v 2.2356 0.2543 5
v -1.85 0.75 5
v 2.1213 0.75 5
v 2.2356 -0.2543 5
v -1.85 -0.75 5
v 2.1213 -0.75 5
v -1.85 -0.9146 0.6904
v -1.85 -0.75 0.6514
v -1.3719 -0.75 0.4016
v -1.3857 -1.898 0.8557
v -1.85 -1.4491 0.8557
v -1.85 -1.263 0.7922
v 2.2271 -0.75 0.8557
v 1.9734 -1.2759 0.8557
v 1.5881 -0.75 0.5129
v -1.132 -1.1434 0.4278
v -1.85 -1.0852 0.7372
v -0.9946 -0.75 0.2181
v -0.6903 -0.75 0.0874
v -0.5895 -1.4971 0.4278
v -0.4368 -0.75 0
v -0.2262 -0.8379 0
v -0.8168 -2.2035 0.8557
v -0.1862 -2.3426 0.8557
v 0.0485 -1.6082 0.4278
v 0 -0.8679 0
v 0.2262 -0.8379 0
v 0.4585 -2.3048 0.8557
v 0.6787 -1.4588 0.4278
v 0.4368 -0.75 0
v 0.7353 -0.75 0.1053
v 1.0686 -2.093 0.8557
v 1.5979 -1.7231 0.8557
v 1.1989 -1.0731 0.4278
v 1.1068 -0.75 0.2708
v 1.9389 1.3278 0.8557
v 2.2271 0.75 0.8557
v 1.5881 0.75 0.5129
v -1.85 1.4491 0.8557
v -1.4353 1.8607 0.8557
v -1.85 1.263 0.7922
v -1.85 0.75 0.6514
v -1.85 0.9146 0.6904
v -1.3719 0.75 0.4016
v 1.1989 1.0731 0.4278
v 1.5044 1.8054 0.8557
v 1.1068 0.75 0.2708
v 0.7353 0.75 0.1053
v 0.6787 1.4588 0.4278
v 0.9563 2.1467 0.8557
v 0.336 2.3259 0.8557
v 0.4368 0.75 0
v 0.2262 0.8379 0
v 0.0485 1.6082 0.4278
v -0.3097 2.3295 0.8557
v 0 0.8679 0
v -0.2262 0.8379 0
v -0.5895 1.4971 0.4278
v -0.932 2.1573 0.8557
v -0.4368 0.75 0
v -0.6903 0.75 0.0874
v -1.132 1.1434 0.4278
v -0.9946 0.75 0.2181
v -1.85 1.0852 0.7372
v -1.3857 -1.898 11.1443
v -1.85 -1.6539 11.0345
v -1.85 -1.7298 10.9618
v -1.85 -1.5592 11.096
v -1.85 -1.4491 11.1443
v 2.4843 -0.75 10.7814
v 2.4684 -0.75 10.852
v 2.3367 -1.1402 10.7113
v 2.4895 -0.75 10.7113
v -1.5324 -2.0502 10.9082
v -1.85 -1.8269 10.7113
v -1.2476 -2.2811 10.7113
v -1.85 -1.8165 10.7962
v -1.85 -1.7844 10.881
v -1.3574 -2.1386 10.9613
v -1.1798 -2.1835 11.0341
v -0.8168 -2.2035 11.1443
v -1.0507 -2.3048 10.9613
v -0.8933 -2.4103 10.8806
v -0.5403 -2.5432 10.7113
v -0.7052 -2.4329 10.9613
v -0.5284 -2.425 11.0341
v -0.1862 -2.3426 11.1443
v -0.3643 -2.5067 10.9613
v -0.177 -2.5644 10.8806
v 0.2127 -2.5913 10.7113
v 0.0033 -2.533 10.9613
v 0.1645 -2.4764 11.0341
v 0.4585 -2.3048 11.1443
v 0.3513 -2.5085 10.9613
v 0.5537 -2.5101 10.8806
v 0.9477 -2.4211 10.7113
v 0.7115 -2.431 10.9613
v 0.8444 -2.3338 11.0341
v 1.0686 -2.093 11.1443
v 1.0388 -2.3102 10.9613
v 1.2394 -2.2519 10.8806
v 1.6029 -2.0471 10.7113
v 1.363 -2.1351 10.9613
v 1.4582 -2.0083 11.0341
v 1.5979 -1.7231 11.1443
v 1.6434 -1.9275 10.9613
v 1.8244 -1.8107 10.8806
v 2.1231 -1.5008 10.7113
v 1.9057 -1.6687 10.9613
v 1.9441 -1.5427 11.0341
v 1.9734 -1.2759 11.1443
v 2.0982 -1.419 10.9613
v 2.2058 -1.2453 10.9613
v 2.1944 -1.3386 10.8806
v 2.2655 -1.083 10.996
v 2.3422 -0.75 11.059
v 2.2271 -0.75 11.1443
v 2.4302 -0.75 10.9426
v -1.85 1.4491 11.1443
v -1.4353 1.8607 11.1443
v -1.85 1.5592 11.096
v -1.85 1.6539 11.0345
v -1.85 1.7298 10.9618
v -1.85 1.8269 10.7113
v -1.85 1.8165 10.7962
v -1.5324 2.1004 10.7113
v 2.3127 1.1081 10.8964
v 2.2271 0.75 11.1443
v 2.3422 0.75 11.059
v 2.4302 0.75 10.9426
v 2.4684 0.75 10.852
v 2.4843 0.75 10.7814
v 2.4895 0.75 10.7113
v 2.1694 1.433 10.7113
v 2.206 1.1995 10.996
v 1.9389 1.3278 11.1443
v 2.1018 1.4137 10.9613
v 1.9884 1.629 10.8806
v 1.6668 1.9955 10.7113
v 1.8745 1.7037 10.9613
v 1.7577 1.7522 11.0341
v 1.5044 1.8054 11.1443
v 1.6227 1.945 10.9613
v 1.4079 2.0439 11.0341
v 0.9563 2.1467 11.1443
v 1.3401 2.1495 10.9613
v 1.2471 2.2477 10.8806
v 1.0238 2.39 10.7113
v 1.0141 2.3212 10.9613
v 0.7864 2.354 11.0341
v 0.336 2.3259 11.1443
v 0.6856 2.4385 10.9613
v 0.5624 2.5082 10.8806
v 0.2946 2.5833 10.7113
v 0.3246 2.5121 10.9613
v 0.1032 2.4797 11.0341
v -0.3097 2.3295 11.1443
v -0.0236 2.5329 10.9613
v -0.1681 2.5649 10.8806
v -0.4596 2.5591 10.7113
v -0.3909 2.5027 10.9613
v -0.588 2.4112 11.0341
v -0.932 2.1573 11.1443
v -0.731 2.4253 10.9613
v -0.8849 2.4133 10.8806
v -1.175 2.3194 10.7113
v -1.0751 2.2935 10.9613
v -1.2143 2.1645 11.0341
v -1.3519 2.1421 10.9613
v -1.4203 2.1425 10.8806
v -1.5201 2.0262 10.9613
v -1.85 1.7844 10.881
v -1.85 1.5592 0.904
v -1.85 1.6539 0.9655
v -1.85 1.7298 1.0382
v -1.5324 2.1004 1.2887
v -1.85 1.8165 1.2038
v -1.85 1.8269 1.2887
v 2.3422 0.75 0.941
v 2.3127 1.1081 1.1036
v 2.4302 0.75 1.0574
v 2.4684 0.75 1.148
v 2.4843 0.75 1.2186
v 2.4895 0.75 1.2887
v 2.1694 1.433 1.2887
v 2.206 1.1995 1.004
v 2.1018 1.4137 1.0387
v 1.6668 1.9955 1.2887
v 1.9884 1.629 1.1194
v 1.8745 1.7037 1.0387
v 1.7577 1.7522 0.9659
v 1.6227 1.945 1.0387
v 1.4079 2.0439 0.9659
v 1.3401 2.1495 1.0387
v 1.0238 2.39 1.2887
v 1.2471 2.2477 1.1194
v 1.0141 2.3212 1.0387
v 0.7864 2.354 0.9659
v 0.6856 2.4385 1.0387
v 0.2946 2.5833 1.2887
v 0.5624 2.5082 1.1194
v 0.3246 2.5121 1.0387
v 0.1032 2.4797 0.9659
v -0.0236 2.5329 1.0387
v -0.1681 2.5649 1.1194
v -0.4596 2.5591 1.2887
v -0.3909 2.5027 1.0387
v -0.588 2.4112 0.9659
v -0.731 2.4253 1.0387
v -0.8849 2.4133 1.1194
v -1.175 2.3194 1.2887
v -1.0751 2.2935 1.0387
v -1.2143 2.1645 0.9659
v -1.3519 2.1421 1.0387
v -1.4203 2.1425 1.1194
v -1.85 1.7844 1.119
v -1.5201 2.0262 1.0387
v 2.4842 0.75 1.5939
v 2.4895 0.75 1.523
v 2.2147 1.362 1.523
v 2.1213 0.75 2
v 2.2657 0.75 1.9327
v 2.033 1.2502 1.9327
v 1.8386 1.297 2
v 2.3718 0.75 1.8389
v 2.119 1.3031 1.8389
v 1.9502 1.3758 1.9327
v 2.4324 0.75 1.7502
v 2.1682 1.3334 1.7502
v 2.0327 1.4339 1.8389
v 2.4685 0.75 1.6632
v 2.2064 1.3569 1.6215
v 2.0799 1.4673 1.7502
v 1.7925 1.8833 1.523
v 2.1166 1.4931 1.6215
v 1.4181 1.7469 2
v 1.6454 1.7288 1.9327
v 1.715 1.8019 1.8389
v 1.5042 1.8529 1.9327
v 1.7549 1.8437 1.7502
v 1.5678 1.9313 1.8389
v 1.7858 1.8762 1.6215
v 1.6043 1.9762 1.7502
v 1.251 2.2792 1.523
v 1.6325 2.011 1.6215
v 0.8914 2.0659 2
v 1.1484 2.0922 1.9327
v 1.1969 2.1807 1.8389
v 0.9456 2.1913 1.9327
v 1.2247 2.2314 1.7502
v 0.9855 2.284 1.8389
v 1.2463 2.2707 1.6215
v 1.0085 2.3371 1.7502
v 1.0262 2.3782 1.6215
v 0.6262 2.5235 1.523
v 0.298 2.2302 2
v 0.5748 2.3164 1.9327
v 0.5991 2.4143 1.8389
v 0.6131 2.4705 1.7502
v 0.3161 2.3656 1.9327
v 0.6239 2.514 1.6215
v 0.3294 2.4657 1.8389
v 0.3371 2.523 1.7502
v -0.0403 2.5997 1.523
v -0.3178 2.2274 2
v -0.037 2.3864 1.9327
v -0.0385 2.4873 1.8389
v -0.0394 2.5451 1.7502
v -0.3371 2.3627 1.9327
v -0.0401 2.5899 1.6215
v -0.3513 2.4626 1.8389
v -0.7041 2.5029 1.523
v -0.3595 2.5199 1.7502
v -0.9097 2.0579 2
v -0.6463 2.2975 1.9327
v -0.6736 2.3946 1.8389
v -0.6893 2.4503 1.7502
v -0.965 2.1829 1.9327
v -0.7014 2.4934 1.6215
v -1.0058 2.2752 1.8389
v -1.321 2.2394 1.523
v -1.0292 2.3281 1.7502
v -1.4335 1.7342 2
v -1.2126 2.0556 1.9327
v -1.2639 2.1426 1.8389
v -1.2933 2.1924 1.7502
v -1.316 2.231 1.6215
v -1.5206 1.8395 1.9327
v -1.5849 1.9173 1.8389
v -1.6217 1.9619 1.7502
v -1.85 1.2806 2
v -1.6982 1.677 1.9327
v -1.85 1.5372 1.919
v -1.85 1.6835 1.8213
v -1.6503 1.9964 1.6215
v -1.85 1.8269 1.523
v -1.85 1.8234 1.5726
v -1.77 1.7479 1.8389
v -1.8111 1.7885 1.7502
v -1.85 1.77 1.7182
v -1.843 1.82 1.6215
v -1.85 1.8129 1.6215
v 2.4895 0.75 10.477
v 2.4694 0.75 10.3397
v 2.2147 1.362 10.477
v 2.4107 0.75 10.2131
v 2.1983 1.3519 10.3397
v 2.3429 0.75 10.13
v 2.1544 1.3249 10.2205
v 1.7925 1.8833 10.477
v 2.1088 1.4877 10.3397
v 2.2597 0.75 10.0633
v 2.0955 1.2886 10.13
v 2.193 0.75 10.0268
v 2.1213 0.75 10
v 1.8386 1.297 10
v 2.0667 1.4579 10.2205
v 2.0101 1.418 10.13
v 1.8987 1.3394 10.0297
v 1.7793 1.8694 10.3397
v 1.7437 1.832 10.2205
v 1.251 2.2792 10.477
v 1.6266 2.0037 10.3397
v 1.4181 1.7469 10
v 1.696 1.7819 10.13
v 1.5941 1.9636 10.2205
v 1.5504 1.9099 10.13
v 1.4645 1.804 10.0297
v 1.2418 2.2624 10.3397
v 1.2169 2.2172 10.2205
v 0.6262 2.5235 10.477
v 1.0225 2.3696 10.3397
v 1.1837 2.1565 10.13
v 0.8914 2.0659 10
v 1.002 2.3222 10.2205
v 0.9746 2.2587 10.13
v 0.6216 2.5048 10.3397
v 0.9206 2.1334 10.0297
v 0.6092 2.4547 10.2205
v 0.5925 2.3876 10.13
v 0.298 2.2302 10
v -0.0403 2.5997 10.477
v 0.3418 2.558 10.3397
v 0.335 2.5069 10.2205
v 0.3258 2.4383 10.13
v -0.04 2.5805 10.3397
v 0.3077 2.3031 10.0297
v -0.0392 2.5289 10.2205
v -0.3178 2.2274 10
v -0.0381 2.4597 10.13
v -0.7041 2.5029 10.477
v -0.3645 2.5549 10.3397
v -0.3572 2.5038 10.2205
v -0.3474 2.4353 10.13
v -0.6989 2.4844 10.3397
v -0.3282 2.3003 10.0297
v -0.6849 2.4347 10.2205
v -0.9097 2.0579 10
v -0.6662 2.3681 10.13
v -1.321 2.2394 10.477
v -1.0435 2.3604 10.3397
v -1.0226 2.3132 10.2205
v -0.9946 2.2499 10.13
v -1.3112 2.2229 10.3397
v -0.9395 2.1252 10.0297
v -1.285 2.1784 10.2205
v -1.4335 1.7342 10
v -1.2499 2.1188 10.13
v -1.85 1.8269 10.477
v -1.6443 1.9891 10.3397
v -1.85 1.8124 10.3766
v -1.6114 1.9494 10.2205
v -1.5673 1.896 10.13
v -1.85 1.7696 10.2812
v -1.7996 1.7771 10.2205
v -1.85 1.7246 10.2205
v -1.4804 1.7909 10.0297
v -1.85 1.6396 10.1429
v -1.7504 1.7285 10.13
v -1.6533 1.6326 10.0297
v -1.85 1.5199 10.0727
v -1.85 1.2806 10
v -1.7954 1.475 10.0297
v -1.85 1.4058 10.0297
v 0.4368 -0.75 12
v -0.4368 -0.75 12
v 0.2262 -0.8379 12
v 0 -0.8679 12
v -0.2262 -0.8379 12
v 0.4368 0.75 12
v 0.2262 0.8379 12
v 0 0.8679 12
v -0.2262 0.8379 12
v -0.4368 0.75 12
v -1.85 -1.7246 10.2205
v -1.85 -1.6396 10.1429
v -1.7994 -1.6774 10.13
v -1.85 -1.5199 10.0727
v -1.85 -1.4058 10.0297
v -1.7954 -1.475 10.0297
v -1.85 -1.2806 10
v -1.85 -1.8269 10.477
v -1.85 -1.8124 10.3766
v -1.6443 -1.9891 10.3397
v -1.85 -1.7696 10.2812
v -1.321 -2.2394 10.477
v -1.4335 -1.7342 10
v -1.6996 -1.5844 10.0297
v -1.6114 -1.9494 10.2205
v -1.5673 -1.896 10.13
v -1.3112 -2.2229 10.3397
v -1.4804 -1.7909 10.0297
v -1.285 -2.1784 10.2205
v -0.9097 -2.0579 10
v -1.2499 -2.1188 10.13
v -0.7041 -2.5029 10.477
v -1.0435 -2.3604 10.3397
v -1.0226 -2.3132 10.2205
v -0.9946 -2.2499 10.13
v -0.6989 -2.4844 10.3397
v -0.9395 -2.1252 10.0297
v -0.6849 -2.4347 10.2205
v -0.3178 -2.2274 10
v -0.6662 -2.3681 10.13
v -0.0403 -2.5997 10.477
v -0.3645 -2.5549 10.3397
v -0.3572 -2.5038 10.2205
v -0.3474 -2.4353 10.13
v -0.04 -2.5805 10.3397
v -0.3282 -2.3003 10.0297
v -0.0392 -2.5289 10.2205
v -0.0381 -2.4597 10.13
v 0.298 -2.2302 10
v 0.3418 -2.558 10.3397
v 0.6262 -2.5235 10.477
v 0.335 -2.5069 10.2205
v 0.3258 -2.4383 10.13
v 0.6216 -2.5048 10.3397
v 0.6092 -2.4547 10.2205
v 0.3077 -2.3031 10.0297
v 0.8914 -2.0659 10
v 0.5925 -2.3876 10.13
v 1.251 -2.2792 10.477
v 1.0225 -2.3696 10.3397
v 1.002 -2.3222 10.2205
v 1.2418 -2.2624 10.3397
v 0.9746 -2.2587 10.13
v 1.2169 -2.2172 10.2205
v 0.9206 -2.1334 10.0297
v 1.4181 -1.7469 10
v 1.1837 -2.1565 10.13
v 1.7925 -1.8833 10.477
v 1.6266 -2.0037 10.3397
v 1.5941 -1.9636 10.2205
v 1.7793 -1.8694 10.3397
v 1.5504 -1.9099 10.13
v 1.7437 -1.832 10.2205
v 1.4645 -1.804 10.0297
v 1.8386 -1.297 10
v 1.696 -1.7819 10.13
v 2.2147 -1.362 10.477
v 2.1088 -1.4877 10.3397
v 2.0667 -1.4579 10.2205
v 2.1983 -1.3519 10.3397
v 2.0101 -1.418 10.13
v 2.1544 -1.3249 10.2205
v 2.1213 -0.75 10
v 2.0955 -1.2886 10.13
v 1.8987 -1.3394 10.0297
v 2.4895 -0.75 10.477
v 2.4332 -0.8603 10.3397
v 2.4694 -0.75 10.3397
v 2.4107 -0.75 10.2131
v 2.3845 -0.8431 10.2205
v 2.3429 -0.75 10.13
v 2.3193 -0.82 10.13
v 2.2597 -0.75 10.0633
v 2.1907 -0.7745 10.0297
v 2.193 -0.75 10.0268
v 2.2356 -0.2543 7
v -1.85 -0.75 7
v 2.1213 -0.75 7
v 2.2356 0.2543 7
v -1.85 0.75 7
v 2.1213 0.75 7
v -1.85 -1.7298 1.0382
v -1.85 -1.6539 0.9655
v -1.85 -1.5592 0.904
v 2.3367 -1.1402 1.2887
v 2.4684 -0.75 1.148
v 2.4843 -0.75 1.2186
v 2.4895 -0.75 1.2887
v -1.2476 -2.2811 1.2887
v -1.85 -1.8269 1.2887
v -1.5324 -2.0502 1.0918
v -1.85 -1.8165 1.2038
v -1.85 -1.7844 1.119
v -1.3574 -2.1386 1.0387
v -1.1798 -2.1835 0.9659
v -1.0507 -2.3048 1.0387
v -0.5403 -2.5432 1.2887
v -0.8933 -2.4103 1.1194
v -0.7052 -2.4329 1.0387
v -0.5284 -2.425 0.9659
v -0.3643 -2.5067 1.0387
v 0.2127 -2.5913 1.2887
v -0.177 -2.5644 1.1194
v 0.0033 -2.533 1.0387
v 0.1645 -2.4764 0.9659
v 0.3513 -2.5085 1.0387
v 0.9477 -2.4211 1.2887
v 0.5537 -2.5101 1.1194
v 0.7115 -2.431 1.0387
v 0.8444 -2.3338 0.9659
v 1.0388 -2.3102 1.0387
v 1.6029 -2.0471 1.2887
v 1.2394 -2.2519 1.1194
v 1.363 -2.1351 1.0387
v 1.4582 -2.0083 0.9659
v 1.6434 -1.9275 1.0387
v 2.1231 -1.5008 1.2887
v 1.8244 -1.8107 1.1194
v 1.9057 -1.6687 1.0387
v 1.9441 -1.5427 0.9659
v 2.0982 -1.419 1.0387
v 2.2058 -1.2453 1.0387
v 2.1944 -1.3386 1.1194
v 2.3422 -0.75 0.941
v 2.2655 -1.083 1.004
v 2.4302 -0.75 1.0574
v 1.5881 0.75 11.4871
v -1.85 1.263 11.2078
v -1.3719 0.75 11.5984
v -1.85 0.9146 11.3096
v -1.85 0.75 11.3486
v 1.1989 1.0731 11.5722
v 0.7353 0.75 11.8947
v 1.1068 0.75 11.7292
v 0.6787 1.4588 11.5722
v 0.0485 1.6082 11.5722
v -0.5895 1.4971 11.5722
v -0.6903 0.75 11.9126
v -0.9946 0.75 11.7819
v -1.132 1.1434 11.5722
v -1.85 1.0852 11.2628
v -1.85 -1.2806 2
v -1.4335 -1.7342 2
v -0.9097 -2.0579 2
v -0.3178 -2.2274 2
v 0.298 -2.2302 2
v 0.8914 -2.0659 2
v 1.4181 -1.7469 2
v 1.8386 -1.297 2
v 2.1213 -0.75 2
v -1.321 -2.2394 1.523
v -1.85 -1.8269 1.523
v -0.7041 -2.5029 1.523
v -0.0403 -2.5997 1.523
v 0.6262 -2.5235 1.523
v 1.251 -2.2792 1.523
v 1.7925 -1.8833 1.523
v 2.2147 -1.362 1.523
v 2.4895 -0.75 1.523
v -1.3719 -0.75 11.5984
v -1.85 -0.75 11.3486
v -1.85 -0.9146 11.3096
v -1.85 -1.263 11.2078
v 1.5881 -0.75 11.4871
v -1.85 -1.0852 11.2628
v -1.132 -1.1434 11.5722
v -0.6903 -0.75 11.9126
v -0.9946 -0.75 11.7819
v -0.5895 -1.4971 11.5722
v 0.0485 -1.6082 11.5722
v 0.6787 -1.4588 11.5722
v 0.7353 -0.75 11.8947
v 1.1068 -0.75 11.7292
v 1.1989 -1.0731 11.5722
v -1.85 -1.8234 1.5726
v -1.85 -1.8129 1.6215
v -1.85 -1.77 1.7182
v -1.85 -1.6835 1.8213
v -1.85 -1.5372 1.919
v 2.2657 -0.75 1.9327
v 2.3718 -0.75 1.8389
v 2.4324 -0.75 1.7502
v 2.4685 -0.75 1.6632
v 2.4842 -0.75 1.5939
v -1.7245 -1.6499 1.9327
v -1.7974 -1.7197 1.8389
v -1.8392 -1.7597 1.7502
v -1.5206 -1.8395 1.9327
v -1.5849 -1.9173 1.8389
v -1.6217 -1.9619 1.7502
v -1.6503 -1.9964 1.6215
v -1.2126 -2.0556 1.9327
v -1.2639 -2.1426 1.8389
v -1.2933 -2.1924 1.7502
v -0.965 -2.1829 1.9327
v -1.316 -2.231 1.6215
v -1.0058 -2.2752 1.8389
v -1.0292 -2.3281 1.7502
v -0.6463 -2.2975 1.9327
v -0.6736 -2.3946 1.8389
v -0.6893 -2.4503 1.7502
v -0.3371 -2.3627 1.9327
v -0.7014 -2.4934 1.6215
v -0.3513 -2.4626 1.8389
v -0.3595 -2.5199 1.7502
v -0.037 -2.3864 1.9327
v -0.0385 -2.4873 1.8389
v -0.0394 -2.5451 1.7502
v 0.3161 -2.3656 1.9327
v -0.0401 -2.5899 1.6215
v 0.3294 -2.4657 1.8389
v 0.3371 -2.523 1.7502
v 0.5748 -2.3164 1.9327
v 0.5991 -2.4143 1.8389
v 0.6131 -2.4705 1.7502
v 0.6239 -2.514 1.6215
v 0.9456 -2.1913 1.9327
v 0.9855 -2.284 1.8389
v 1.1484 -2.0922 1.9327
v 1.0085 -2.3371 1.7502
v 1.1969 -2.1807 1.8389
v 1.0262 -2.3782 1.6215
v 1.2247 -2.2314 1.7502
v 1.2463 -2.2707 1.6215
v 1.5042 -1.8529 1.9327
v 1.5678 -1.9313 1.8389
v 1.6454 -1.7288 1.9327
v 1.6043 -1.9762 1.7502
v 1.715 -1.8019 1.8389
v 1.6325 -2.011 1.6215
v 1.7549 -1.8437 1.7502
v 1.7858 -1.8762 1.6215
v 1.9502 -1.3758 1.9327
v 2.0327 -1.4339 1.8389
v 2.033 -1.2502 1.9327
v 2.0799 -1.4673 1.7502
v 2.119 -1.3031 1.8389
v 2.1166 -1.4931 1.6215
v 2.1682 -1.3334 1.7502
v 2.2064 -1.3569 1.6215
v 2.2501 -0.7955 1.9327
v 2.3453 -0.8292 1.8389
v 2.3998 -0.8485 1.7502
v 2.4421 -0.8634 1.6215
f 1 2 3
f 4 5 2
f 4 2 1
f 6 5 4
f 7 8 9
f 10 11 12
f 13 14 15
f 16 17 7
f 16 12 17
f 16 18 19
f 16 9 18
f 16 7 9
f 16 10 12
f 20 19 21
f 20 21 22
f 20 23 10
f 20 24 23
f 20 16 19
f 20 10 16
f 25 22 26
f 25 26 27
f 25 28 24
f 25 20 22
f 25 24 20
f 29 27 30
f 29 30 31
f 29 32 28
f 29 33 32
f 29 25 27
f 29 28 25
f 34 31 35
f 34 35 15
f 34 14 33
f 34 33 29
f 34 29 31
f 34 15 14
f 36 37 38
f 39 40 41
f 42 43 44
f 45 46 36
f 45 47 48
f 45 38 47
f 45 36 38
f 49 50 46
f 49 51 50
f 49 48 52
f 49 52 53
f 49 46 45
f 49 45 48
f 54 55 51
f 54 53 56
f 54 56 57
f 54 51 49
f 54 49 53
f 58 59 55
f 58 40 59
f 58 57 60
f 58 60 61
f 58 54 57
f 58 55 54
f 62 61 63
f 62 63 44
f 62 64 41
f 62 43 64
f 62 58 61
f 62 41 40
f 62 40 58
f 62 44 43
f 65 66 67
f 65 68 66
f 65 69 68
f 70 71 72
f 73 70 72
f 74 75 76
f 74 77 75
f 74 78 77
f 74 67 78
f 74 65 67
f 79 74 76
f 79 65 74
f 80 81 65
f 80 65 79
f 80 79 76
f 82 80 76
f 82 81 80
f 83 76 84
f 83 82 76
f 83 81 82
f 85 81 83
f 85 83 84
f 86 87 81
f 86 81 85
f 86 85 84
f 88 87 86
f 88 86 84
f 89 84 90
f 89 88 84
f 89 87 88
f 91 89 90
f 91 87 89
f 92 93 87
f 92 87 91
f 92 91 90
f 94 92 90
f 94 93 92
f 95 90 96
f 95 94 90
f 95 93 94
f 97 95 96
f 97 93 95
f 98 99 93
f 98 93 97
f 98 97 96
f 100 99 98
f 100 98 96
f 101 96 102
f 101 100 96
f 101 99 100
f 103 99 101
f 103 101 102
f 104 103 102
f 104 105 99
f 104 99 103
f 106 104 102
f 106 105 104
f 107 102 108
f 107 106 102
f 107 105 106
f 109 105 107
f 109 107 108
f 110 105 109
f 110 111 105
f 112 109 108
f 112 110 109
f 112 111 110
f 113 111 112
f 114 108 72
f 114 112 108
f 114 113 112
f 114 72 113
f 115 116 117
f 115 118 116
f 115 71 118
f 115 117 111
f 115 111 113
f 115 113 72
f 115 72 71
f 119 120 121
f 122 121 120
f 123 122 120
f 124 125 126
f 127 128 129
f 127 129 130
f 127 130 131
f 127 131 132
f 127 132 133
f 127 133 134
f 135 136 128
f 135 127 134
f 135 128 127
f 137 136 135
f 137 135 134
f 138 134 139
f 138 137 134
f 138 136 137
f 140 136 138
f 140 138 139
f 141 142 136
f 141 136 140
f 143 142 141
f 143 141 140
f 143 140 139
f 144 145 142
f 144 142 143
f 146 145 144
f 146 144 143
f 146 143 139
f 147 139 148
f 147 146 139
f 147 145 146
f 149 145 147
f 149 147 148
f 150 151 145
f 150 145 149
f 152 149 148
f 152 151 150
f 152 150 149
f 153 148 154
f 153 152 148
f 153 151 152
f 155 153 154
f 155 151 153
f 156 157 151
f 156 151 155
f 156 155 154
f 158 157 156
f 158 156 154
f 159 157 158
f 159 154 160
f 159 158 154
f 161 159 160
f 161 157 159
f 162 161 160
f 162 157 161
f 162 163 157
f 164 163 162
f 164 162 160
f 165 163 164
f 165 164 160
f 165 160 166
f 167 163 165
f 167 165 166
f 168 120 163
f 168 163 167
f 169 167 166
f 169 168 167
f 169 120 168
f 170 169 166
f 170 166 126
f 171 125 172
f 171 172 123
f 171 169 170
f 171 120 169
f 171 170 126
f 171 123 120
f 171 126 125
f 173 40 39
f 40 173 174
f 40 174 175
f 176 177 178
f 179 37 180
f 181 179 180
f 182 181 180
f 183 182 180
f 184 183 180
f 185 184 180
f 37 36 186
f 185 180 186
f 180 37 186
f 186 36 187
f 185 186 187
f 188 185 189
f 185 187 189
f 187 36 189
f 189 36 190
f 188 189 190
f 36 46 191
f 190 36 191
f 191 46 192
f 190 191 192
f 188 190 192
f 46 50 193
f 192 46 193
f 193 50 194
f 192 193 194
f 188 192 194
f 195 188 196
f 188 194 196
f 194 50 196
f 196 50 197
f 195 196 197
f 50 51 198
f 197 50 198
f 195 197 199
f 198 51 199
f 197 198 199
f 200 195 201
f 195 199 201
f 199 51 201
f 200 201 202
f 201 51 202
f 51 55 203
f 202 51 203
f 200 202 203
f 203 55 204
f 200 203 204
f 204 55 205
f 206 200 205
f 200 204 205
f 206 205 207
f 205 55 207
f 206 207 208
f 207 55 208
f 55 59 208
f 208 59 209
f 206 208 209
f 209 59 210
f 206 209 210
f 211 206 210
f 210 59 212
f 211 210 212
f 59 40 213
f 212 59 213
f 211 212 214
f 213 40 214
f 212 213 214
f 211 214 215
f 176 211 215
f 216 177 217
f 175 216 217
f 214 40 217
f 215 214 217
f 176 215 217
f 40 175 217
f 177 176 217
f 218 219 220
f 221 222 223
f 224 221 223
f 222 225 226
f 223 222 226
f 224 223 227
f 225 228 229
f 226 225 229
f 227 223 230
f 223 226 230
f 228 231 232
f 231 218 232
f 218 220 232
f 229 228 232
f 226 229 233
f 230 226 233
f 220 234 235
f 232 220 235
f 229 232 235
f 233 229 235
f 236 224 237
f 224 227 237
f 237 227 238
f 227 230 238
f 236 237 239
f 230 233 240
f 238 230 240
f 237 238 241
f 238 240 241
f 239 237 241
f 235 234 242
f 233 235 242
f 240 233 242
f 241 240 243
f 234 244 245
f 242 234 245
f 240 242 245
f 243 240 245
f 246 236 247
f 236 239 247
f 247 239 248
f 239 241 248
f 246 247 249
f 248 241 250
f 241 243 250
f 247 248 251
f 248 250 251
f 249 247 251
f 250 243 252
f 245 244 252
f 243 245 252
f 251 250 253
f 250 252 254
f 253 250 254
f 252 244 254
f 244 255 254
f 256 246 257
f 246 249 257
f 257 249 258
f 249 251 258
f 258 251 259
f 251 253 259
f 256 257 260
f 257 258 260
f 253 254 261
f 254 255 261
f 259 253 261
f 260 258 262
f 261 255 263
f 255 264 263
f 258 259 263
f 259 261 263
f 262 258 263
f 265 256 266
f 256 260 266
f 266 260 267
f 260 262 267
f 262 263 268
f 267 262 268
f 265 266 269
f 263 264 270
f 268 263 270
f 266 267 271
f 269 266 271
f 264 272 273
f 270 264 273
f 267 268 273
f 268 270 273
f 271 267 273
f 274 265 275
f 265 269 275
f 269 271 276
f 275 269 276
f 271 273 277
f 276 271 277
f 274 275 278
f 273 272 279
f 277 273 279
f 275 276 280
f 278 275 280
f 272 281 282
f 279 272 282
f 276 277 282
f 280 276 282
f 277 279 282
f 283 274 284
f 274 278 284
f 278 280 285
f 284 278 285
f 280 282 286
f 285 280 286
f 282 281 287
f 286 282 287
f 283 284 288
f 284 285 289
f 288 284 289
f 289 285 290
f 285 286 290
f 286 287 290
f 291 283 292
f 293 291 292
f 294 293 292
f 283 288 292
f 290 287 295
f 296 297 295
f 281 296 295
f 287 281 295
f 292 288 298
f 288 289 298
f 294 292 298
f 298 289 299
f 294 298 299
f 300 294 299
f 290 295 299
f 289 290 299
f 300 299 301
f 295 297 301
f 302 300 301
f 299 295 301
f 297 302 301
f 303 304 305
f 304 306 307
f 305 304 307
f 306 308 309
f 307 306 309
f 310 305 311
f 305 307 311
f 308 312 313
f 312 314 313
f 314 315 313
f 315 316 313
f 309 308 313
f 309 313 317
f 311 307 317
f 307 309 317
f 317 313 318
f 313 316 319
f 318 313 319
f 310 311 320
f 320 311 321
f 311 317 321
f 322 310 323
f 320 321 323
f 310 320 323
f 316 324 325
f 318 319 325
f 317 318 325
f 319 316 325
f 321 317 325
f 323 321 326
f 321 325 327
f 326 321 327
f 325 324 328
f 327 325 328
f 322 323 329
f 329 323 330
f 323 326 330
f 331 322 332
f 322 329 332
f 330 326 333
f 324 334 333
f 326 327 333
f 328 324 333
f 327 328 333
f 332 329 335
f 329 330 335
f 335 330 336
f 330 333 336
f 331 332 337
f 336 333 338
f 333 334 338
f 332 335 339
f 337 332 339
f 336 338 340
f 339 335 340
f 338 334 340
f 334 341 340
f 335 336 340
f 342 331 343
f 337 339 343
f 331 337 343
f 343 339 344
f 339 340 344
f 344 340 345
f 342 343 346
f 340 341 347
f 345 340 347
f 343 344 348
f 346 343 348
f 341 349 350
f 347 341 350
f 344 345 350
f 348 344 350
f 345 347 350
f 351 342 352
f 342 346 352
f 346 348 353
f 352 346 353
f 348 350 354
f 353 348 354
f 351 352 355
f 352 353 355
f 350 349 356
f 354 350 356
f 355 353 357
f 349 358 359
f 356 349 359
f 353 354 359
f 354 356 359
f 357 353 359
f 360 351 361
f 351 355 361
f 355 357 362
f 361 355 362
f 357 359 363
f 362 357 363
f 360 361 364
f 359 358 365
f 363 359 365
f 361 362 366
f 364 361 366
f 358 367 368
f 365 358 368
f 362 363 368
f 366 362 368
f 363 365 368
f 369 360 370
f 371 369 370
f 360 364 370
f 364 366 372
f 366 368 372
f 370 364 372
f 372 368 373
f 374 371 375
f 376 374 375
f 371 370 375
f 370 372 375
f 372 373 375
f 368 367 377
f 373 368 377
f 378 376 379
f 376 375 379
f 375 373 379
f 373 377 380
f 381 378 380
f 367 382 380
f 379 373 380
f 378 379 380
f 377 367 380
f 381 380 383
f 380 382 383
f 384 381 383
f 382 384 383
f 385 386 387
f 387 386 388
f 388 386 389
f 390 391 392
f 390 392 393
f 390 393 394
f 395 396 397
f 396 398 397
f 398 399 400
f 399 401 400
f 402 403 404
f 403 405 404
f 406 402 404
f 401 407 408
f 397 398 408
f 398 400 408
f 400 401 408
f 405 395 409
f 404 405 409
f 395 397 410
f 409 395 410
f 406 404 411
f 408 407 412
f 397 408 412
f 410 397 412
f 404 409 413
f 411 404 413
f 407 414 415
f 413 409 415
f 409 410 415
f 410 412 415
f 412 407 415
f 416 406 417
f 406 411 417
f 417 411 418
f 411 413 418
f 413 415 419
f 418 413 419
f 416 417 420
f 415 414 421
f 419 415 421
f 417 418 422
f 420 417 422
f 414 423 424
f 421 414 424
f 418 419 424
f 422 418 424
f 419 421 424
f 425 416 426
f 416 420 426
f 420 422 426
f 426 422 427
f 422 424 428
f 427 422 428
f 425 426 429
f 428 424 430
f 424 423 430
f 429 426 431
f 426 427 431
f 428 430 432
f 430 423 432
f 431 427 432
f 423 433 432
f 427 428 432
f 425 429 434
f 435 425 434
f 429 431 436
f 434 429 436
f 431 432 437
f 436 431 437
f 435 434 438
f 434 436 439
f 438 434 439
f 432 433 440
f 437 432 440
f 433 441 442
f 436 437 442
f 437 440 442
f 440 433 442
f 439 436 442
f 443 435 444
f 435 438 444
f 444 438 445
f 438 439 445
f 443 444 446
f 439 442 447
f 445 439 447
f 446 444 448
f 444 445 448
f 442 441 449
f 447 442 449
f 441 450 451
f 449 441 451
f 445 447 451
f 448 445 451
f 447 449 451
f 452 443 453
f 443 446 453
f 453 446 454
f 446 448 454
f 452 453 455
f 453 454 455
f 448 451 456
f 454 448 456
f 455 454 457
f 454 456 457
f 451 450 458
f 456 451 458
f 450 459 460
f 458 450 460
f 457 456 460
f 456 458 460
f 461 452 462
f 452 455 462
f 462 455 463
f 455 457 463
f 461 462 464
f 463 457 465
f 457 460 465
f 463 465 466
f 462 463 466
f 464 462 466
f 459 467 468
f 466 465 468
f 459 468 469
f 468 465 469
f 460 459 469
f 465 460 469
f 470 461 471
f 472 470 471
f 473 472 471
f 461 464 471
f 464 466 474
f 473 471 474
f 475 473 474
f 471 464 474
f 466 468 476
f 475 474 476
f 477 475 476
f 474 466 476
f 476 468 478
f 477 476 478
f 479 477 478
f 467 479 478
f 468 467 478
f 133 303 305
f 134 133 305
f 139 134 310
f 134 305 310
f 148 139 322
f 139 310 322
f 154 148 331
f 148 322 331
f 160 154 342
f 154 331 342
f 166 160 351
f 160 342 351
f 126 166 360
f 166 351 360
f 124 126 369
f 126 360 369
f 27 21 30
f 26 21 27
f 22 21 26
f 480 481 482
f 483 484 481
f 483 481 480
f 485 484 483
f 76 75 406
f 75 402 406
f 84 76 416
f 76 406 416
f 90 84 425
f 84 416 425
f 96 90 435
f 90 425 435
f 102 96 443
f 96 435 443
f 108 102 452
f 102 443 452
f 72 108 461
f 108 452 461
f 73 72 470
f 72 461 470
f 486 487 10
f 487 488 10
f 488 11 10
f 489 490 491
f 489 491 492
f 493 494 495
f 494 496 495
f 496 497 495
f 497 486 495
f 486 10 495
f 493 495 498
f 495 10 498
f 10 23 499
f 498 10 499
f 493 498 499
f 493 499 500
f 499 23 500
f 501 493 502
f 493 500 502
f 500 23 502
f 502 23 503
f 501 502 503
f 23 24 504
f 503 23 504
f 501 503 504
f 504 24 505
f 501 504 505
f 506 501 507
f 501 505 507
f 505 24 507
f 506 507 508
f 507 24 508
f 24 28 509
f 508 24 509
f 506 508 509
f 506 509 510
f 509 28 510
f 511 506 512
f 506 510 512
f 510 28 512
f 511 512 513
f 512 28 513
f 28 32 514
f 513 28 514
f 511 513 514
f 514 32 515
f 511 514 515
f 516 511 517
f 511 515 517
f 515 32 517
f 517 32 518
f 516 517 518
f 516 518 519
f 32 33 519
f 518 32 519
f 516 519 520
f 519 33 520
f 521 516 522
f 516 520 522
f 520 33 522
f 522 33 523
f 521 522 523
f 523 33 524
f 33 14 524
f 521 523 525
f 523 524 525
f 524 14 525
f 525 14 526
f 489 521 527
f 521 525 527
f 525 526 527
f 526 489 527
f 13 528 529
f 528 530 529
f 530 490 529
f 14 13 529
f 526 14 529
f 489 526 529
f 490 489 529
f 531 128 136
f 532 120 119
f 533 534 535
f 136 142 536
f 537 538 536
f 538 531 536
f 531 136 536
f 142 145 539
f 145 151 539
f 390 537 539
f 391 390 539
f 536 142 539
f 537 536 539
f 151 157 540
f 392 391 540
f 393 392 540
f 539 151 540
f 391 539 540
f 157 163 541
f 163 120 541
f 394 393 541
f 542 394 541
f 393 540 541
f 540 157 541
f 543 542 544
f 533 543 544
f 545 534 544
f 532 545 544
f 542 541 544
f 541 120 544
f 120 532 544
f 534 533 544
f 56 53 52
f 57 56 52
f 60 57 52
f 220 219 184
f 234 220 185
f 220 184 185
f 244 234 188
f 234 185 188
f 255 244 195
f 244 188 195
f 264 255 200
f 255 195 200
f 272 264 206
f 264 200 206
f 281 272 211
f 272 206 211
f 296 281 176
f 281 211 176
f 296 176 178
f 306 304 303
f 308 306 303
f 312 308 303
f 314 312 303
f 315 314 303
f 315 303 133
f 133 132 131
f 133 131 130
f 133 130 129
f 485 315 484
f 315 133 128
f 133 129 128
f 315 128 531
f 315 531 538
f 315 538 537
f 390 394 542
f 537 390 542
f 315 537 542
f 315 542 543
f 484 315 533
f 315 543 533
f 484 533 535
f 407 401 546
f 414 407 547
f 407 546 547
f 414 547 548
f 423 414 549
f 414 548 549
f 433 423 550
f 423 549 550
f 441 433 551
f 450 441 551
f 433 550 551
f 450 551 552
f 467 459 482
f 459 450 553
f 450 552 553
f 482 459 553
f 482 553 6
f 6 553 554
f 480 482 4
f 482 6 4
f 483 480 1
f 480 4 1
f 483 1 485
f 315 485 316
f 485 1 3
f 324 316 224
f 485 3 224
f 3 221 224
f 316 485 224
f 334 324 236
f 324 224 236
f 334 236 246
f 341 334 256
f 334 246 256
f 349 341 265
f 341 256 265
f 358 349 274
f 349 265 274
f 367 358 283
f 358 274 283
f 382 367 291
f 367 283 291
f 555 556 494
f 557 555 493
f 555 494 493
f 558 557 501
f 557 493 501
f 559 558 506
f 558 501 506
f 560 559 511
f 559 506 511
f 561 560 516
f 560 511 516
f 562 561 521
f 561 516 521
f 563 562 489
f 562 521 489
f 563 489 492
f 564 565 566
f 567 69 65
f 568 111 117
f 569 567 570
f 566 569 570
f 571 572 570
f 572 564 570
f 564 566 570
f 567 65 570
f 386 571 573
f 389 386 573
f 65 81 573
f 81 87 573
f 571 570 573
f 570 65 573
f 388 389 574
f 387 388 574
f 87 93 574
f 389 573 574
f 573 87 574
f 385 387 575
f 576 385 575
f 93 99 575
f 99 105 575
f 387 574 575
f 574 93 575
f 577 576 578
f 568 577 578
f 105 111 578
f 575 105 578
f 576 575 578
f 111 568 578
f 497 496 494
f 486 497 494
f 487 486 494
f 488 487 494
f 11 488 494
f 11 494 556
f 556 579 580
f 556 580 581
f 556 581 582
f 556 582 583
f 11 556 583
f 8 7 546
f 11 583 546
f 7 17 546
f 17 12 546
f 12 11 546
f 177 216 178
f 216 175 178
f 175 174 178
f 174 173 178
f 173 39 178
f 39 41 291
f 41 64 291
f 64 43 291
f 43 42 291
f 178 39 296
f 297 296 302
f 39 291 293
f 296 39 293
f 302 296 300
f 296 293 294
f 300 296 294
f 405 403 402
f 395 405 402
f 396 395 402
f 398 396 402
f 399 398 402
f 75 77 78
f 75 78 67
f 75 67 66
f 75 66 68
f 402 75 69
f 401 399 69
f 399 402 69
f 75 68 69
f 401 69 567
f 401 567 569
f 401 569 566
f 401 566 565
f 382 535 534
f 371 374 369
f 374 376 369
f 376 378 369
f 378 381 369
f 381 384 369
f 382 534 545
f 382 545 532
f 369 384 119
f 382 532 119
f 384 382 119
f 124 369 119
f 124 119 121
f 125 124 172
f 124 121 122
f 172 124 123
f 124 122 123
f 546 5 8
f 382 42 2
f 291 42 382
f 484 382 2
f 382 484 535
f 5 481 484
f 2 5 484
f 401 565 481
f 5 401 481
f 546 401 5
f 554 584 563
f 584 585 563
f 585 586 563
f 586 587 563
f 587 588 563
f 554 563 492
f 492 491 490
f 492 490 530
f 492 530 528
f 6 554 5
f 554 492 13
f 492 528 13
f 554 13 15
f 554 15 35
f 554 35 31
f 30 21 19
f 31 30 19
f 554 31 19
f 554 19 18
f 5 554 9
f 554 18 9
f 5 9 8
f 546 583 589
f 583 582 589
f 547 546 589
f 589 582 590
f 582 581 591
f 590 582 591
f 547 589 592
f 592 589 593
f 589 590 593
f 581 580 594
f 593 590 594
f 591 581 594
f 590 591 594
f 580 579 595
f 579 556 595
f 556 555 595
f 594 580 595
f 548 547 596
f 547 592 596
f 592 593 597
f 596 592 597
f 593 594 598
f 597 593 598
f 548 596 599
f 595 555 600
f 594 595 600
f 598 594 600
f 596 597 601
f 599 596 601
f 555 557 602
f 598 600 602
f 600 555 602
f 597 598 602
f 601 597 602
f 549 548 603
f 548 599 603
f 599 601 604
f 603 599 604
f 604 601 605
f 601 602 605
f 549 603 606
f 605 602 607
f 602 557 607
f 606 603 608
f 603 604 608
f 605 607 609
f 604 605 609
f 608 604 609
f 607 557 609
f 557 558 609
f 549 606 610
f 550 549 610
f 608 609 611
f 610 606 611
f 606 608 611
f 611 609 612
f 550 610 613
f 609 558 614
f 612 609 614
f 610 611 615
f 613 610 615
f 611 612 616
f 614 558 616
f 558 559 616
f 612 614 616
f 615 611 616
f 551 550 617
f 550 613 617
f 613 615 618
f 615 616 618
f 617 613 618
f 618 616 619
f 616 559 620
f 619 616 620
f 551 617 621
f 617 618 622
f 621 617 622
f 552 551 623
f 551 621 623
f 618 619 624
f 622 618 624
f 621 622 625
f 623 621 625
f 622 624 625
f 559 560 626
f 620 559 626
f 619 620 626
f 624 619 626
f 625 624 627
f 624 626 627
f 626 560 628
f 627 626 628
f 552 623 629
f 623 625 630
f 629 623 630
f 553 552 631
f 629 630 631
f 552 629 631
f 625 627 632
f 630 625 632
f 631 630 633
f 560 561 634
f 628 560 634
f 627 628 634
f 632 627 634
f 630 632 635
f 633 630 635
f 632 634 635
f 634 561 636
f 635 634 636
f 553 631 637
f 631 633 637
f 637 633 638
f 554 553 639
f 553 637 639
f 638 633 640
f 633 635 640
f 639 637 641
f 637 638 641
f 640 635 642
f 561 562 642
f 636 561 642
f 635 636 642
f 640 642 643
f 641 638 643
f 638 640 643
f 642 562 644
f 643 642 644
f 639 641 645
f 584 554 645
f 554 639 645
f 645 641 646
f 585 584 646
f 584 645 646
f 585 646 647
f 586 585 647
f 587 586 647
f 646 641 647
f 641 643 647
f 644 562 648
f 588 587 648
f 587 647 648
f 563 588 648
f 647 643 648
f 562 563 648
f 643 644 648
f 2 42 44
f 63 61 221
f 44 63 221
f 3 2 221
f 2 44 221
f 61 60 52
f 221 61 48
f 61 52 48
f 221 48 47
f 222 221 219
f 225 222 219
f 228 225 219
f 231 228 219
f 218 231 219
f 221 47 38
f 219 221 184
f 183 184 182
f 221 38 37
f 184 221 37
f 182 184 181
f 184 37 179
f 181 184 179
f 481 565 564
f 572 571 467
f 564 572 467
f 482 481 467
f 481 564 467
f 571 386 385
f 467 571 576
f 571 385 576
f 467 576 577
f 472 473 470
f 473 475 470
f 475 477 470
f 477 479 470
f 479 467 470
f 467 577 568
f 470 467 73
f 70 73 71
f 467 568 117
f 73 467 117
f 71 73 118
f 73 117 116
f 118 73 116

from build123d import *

# Parameters (mm, degrees)
F0_R         = 2.6
F1_DEPTH     = 2
F2_R         = 2.25
F3_DEPTH     = 8
F4_R         = 2.6
F5_DEPTH     = 2
F8_DEPTH     = 5
F10_DEPTH    = 5
F11_C1_SIZE2 = 1
F11_C1_SIZE  = 1.7320508076
F11_C2_SIZE2 = 1
F11_C2_SIZE  = 1.7320508076
F12_C1_SIZE2 = 1
F12_C1_SIZE  = 1.7320508076
F12_C2_SIZE2 = 1
F12_C2_SIZE  = 1.7320508076
F13_R        = 0.5
F15_DEPTH    = 25


# Not quite as in the source:
# - a fillet or chamfer that OpenCascade refuses, or shapes differently, is made with other operations: its cross-section is extruded or revolved along the edge and cut away or added


with BuildPart() as f1:
    # F0 (on Top) → F1 (new body)
    with BuildSketch(Plane.XY):
        Circle(F0_R)
    extrude(amount=F1_DEPTH)

    # F2 (on face) → F3 (join)
    with BuildSketch(Plane.XY.offset(2)):
        Circle(F2_R)
    extrude(amount=F3_DEPTH)

    # F4 (on face) → F5 (join)
    with BuildSketch(Plane.XY.offset(10)):
        Circle(F4_R)
    extrude(amount=F5_DEPTH)

    # F6: fillet of radius 0.5 on 2 edges, made by hand

    # F6_s1 → F6_t2 (revolve, cut)
    with BuildSketch(Plane.XZ):
        with BuildLine():
            ThreePointArc((2.25, 2), (2.5031128874, 1.8188343884), (2.6, 1.5230303993))
            Line((2.6, 1.5230303993), (2.6, 2))
            Line((2.6, 2), (2.25, 2))
        make_face()
    revolve(axis=Axis((0, 0, 2), (0, 0, 1)), mode=Mode.SUBTRACT)

    # F6_s3 → F6_t4 (revolve, cut)
    with BuildSketch(Plane.XZ):
        with BuildLine():
            ThreePointArc((2.6, 10.4769696007), (2.5031128874, 10.1811656116), (2.25, 10))
            Line((2.25, 10), (2.6, 10))
            Line((2.6, 10), (2.6, 10.4769696007))
        make_face()
    revolve(axis=Axis((0, 0, 10), (0, 0, 1)), mode=Mode.SUBTRACT)

    # F7 (on face) → F8 (cut)
    with BuildSketch(Plane(origin=(0, 0, 0), x_dir=(1, 0, 0), z_dir=(0, 0, -1))):
        with BuildLine():
            ThreePointArc((-2.4894778569, 0.75), (-2.6, 0), (-2.4894778569, -0.75))
            Line((-2.4894778569, -0.75), (2.4894778569, -0.75))
            ThreePointArc((2.4894778569, -0.75), (2.6, 0), (2.4894778569, 0.75))
            Line((2.4894778569, 0.75), (-2.4894778569, 0.75))
        make_face()
    extrude(amount=-F8_DEPTH, mode=Mode.SUBTRACT)

    # F9 (on face) → F10 (cut)
    with BuildSketch(Plane.XY.offset(12)):
        with BuildLine():
            ThreePointArc((-2.4894778569, 0.75), (-2.6, 0), (-2.4894778569, -0.75))
            Line((-2.4894778569, -0.75), (2.4894778569, -0.75))
            ThreePointArc((2.4894778569, -0.75), (2.6, 0), (2.4894778569, 0.75))
            Line((2.4894778569, 0.75), (-2.4894778569, 0.75))
        make_face()
    extrude(amount=-F10_DEPTH, mode=Mode.SUBTRACT)

    # F11: chamfer of 1 x 1.7320508076 on 2 edges, made by hand

    # F11_c1
    f11_c1_edges = [f1.edges().sort_by_distance(p)[0] for p in [
        (0, 2.6, 0),
    ]]
    f11_c1_side = f1.faces().sort_by_distance((0, 2.58, 0))[0]
    chamfer(f11_c1_edges, length=F11_C1_SIZE, length2=F11_C1_SIZE2, reference=f11_c1_side)

    # F11_c2
    f11_c2_edges = [f1.edges().sort_by_distance(p)[0] for p in [
        (0, -2.6, 0),
    ]]
    f11_c2_side = f1.faces().sort_by_distance((0, -2.58, 0))[0]
    chamfer(f11_c2_edges, length=F11_C2_SIZE, length2=F11_C2_SIZE2, reference=f11_c2_side)

    # F12: chamfer of 1 x 1.7320508076 on 2 edges, made by hand

    # F12_c1
    f12_c1_edges = [f1.edges().sort_by_distance(p)[0] for p in [
        (0, -2.6, 12),
    ]]
    f12_c1_side = f1.faces().sort_by_distance((0, -2.58, 12))[0]
    chamfer(f12_c1_edges, length=F12_C1_SIZE, length2=F12_C1_SIZE2, reference=f12_c1_side)

    # F12_c2
    f12_c2_edges = [f1.edges().sort_by_distance(p)[0] for p in [
        (0, 2.6, 12),
    ]]
    f12_c2_side = f1.faces().sort_by_distance((0, 2.58, 12))[0]
    chamfer(f12_c2_edges, length=F12_C2_SIZE, length2=F12_C2_SIZE2, reference=f12_c2_side)

    # F13
    f13_edges = [f1.edges().sort_by_distance(p)[0] for p in [
        (0, -2.6, 11),
        (0, 2.6, 11),
        (0, -2.6, 1),
        (0, 2.6, 1),
    ]]
    fillet(f13_edges, radius=F13_R)

    # F14 (on face) → F15 (cut)
    with BuildSketch(Plane.XY.offset(12)):
        with BuildLine():
            Line((-1.85, -1.8268825906), (-1.85, 1.8268825906))
            ThreePointArc((-1.85, 1.8268825906), (-2.6, 0), (-1.85, -1.8268825906))
        make_face()
    extrude(amount=-F15_DEPTH, mode=Mode.SUBTRACT)


solid = f1.part
